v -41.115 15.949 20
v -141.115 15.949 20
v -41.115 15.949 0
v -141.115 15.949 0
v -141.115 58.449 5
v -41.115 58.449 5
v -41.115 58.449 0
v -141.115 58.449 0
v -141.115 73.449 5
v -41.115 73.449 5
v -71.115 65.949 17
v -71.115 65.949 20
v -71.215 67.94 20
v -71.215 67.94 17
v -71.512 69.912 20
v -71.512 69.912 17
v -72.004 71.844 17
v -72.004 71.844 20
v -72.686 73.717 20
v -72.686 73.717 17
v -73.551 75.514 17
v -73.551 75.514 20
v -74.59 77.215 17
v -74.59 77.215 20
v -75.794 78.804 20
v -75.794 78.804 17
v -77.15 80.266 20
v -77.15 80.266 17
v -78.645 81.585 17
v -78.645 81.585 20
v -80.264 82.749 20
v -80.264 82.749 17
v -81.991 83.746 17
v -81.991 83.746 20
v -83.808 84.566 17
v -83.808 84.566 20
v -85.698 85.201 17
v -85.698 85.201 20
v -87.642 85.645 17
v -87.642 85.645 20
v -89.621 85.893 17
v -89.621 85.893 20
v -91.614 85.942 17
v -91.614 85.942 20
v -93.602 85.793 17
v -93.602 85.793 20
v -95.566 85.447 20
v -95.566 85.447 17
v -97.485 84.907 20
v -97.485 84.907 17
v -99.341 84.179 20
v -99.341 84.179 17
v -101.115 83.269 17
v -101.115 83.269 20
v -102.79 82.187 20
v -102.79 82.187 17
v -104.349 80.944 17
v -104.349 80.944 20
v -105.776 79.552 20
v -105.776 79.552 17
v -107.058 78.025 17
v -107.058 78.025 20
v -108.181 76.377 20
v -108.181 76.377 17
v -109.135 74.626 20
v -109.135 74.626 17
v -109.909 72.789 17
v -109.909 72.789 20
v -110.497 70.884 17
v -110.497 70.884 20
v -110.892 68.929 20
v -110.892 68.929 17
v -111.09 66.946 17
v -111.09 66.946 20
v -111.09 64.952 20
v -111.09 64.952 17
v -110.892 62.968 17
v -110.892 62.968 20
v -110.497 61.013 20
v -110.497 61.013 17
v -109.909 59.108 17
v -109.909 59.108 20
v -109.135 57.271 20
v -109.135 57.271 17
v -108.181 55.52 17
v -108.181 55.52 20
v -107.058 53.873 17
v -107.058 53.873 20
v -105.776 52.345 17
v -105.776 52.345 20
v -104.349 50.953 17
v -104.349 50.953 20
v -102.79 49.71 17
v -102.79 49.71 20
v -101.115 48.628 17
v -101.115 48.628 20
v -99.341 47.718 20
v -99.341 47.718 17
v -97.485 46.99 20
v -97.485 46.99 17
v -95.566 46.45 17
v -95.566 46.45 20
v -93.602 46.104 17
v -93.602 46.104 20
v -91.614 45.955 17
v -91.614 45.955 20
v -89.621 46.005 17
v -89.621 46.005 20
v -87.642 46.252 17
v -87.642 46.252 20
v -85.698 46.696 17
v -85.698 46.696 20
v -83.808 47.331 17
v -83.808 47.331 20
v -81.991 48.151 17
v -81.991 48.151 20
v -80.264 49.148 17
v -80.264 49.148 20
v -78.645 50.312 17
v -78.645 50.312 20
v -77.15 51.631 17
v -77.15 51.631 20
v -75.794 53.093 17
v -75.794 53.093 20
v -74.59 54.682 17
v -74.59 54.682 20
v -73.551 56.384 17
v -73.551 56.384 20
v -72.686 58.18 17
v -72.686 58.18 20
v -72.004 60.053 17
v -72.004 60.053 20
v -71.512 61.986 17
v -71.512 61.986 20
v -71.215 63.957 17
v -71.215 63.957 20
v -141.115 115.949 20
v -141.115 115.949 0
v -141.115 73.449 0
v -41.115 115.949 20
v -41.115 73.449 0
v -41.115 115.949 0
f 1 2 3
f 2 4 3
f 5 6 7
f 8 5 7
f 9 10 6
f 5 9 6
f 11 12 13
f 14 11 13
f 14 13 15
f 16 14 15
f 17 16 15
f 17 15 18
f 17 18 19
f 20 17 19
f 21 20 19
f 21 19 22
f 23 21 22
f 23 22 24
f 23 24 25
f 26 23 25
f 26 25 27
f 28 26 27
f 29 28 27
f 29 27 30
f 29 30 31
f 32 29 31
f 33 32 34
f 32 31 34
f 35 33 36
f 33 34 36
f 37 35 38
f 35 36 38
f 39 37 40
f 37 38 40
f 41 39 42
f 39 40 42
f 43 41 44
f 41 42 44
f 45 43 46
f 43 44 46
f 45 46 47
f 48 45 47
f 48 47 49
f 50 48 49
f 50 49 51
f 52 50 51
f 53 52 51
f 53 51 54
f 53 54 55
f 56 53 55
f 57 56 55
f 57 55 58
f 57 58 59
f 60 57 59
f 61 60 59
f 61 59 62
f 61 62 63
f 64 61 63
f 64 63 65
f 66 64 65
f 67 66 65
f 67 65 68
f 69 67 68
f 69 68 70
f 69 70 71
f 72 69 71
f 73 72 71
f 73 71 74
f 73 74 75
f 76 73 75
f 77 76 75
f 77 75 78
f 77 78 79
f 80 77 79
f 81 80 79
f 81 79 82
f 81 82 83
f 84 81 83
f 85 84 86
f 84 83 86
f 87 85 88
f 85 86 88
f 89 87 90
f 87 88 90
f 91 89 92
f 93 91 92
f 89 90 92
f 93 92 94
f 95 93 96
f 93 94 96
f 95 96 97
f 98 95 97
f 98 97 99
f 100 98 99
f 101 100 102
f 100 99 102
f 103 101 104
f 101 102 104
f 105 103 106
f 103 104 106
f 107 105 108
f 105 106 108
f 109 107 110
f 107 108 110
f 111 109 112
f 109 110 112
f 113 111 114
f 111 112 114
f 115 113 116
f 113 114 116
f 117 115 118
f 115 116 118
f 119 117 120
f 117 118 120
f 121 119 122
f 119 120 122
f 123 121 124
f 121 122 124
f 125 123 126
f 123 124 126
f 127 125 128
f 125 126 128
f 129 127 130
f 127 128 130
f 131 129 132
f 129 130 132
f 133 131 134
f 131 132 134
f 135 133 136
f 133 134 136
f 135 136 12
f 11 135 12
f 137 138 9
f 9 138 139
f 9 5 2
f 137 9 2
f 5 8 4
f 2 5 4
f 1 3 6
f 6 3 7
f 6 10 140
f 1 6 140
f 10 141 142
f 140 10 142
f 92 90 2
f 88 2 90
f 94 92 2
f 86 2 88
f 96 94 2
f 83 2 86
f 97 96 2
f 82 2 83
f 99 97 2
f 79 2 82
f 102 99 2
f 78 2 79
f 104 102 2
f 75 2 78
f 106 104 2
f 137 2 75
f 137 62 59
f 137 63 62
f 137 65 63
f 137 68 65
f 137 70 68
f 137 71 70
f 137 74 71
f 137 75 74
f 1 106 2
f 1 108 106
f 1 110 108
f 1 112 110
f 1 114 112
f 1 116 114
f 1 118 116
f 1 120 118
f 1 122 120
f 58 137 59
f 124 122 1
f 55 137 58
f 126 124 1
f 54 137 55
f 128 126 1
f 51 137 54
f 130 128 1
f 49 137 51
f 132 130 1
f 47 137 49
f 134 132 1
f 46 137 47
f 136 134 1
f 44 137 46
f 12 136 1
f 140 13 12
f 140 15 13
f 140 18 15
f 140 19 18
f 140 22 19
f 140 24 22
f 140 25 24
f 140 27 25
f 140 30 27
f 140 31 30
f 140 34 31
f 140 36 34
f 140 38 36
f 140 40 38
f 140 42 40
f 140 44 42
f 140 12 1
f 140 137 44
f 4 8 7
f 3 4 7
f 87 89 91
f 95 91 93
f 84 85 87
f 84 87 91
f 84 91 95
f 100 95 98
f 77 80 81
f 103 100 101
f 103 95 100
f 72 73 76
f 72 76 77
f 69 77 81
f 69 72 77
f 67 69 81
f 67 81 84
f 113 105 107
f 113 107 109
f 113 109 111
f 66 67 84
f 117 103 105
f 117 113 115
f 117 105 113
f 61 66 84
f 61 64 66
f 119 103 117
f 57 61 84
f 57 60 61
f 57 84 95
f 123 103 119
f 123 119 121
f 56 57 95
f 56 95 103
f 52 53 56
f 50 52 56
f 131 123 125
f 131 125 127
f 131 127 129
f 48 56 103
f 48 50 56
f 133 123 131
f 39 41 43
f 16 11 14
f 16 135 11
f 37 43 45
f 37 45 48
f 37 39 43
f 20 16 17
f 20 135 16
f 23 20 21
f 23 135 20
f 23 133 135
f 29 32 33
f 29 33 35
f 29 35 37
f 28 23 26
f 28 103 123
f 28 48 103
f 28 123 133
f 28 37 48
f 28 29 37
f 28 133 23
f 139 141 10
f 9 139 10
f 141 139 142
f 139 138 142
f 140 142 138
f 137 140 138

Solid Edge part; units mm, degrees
sketch "Sketch1" plane through (0, 0, 0) normal (0, 0, 1) x (1, 0, 0)
  line L0 (-141.1152, 15.9486) -> (-41.1152, 15.9486)
  line L1 (-41.1152, 15.9486) -> (-41.1152, 115.9486)
  line L2 (-41.1152, 115.9486) -> (-141.1152, 115.9486)
  line L3 (-141.1152, 115.9486) -> (-141.1152, 15.9486)
  dimension "D1" = 100
  dimension "D2" = 100
extrude "Protrusion1" add sketch "Sketch1" along normal blind 20
sketch "Sketch2" plane through (-66.1152, 40.9486, 20) normal (0, 0, 1) x (1, 0, 0)
  circle A0 centre (-25, 25) radius 20
  dimension "D1" = 50
  dimension "D2" = 50
extrude "ExtrudedCutout_1" cut sketch "Sketch2" against normal blind 3
sketch "Sketch3" plane through (-41.1152, 65.9486, 10) normal (1, 0, 0) x (0, 1, 0)
  line L0 (-7.5, -10) -> (7.5, -10)
  line L1 (7.5, -10) -> (7.5, -5)
  line L2 (7.5, -5) -> (-7.5, -5)
  line L3 (-7.5, -5) -> (-7.5, -10)
  dimension "D1" = 15
  dimension "D2" = 5
extrude "Cutout1" cut sketch "Sketch3" against normal through all
properties material "Aluminum, 6061-T6"
